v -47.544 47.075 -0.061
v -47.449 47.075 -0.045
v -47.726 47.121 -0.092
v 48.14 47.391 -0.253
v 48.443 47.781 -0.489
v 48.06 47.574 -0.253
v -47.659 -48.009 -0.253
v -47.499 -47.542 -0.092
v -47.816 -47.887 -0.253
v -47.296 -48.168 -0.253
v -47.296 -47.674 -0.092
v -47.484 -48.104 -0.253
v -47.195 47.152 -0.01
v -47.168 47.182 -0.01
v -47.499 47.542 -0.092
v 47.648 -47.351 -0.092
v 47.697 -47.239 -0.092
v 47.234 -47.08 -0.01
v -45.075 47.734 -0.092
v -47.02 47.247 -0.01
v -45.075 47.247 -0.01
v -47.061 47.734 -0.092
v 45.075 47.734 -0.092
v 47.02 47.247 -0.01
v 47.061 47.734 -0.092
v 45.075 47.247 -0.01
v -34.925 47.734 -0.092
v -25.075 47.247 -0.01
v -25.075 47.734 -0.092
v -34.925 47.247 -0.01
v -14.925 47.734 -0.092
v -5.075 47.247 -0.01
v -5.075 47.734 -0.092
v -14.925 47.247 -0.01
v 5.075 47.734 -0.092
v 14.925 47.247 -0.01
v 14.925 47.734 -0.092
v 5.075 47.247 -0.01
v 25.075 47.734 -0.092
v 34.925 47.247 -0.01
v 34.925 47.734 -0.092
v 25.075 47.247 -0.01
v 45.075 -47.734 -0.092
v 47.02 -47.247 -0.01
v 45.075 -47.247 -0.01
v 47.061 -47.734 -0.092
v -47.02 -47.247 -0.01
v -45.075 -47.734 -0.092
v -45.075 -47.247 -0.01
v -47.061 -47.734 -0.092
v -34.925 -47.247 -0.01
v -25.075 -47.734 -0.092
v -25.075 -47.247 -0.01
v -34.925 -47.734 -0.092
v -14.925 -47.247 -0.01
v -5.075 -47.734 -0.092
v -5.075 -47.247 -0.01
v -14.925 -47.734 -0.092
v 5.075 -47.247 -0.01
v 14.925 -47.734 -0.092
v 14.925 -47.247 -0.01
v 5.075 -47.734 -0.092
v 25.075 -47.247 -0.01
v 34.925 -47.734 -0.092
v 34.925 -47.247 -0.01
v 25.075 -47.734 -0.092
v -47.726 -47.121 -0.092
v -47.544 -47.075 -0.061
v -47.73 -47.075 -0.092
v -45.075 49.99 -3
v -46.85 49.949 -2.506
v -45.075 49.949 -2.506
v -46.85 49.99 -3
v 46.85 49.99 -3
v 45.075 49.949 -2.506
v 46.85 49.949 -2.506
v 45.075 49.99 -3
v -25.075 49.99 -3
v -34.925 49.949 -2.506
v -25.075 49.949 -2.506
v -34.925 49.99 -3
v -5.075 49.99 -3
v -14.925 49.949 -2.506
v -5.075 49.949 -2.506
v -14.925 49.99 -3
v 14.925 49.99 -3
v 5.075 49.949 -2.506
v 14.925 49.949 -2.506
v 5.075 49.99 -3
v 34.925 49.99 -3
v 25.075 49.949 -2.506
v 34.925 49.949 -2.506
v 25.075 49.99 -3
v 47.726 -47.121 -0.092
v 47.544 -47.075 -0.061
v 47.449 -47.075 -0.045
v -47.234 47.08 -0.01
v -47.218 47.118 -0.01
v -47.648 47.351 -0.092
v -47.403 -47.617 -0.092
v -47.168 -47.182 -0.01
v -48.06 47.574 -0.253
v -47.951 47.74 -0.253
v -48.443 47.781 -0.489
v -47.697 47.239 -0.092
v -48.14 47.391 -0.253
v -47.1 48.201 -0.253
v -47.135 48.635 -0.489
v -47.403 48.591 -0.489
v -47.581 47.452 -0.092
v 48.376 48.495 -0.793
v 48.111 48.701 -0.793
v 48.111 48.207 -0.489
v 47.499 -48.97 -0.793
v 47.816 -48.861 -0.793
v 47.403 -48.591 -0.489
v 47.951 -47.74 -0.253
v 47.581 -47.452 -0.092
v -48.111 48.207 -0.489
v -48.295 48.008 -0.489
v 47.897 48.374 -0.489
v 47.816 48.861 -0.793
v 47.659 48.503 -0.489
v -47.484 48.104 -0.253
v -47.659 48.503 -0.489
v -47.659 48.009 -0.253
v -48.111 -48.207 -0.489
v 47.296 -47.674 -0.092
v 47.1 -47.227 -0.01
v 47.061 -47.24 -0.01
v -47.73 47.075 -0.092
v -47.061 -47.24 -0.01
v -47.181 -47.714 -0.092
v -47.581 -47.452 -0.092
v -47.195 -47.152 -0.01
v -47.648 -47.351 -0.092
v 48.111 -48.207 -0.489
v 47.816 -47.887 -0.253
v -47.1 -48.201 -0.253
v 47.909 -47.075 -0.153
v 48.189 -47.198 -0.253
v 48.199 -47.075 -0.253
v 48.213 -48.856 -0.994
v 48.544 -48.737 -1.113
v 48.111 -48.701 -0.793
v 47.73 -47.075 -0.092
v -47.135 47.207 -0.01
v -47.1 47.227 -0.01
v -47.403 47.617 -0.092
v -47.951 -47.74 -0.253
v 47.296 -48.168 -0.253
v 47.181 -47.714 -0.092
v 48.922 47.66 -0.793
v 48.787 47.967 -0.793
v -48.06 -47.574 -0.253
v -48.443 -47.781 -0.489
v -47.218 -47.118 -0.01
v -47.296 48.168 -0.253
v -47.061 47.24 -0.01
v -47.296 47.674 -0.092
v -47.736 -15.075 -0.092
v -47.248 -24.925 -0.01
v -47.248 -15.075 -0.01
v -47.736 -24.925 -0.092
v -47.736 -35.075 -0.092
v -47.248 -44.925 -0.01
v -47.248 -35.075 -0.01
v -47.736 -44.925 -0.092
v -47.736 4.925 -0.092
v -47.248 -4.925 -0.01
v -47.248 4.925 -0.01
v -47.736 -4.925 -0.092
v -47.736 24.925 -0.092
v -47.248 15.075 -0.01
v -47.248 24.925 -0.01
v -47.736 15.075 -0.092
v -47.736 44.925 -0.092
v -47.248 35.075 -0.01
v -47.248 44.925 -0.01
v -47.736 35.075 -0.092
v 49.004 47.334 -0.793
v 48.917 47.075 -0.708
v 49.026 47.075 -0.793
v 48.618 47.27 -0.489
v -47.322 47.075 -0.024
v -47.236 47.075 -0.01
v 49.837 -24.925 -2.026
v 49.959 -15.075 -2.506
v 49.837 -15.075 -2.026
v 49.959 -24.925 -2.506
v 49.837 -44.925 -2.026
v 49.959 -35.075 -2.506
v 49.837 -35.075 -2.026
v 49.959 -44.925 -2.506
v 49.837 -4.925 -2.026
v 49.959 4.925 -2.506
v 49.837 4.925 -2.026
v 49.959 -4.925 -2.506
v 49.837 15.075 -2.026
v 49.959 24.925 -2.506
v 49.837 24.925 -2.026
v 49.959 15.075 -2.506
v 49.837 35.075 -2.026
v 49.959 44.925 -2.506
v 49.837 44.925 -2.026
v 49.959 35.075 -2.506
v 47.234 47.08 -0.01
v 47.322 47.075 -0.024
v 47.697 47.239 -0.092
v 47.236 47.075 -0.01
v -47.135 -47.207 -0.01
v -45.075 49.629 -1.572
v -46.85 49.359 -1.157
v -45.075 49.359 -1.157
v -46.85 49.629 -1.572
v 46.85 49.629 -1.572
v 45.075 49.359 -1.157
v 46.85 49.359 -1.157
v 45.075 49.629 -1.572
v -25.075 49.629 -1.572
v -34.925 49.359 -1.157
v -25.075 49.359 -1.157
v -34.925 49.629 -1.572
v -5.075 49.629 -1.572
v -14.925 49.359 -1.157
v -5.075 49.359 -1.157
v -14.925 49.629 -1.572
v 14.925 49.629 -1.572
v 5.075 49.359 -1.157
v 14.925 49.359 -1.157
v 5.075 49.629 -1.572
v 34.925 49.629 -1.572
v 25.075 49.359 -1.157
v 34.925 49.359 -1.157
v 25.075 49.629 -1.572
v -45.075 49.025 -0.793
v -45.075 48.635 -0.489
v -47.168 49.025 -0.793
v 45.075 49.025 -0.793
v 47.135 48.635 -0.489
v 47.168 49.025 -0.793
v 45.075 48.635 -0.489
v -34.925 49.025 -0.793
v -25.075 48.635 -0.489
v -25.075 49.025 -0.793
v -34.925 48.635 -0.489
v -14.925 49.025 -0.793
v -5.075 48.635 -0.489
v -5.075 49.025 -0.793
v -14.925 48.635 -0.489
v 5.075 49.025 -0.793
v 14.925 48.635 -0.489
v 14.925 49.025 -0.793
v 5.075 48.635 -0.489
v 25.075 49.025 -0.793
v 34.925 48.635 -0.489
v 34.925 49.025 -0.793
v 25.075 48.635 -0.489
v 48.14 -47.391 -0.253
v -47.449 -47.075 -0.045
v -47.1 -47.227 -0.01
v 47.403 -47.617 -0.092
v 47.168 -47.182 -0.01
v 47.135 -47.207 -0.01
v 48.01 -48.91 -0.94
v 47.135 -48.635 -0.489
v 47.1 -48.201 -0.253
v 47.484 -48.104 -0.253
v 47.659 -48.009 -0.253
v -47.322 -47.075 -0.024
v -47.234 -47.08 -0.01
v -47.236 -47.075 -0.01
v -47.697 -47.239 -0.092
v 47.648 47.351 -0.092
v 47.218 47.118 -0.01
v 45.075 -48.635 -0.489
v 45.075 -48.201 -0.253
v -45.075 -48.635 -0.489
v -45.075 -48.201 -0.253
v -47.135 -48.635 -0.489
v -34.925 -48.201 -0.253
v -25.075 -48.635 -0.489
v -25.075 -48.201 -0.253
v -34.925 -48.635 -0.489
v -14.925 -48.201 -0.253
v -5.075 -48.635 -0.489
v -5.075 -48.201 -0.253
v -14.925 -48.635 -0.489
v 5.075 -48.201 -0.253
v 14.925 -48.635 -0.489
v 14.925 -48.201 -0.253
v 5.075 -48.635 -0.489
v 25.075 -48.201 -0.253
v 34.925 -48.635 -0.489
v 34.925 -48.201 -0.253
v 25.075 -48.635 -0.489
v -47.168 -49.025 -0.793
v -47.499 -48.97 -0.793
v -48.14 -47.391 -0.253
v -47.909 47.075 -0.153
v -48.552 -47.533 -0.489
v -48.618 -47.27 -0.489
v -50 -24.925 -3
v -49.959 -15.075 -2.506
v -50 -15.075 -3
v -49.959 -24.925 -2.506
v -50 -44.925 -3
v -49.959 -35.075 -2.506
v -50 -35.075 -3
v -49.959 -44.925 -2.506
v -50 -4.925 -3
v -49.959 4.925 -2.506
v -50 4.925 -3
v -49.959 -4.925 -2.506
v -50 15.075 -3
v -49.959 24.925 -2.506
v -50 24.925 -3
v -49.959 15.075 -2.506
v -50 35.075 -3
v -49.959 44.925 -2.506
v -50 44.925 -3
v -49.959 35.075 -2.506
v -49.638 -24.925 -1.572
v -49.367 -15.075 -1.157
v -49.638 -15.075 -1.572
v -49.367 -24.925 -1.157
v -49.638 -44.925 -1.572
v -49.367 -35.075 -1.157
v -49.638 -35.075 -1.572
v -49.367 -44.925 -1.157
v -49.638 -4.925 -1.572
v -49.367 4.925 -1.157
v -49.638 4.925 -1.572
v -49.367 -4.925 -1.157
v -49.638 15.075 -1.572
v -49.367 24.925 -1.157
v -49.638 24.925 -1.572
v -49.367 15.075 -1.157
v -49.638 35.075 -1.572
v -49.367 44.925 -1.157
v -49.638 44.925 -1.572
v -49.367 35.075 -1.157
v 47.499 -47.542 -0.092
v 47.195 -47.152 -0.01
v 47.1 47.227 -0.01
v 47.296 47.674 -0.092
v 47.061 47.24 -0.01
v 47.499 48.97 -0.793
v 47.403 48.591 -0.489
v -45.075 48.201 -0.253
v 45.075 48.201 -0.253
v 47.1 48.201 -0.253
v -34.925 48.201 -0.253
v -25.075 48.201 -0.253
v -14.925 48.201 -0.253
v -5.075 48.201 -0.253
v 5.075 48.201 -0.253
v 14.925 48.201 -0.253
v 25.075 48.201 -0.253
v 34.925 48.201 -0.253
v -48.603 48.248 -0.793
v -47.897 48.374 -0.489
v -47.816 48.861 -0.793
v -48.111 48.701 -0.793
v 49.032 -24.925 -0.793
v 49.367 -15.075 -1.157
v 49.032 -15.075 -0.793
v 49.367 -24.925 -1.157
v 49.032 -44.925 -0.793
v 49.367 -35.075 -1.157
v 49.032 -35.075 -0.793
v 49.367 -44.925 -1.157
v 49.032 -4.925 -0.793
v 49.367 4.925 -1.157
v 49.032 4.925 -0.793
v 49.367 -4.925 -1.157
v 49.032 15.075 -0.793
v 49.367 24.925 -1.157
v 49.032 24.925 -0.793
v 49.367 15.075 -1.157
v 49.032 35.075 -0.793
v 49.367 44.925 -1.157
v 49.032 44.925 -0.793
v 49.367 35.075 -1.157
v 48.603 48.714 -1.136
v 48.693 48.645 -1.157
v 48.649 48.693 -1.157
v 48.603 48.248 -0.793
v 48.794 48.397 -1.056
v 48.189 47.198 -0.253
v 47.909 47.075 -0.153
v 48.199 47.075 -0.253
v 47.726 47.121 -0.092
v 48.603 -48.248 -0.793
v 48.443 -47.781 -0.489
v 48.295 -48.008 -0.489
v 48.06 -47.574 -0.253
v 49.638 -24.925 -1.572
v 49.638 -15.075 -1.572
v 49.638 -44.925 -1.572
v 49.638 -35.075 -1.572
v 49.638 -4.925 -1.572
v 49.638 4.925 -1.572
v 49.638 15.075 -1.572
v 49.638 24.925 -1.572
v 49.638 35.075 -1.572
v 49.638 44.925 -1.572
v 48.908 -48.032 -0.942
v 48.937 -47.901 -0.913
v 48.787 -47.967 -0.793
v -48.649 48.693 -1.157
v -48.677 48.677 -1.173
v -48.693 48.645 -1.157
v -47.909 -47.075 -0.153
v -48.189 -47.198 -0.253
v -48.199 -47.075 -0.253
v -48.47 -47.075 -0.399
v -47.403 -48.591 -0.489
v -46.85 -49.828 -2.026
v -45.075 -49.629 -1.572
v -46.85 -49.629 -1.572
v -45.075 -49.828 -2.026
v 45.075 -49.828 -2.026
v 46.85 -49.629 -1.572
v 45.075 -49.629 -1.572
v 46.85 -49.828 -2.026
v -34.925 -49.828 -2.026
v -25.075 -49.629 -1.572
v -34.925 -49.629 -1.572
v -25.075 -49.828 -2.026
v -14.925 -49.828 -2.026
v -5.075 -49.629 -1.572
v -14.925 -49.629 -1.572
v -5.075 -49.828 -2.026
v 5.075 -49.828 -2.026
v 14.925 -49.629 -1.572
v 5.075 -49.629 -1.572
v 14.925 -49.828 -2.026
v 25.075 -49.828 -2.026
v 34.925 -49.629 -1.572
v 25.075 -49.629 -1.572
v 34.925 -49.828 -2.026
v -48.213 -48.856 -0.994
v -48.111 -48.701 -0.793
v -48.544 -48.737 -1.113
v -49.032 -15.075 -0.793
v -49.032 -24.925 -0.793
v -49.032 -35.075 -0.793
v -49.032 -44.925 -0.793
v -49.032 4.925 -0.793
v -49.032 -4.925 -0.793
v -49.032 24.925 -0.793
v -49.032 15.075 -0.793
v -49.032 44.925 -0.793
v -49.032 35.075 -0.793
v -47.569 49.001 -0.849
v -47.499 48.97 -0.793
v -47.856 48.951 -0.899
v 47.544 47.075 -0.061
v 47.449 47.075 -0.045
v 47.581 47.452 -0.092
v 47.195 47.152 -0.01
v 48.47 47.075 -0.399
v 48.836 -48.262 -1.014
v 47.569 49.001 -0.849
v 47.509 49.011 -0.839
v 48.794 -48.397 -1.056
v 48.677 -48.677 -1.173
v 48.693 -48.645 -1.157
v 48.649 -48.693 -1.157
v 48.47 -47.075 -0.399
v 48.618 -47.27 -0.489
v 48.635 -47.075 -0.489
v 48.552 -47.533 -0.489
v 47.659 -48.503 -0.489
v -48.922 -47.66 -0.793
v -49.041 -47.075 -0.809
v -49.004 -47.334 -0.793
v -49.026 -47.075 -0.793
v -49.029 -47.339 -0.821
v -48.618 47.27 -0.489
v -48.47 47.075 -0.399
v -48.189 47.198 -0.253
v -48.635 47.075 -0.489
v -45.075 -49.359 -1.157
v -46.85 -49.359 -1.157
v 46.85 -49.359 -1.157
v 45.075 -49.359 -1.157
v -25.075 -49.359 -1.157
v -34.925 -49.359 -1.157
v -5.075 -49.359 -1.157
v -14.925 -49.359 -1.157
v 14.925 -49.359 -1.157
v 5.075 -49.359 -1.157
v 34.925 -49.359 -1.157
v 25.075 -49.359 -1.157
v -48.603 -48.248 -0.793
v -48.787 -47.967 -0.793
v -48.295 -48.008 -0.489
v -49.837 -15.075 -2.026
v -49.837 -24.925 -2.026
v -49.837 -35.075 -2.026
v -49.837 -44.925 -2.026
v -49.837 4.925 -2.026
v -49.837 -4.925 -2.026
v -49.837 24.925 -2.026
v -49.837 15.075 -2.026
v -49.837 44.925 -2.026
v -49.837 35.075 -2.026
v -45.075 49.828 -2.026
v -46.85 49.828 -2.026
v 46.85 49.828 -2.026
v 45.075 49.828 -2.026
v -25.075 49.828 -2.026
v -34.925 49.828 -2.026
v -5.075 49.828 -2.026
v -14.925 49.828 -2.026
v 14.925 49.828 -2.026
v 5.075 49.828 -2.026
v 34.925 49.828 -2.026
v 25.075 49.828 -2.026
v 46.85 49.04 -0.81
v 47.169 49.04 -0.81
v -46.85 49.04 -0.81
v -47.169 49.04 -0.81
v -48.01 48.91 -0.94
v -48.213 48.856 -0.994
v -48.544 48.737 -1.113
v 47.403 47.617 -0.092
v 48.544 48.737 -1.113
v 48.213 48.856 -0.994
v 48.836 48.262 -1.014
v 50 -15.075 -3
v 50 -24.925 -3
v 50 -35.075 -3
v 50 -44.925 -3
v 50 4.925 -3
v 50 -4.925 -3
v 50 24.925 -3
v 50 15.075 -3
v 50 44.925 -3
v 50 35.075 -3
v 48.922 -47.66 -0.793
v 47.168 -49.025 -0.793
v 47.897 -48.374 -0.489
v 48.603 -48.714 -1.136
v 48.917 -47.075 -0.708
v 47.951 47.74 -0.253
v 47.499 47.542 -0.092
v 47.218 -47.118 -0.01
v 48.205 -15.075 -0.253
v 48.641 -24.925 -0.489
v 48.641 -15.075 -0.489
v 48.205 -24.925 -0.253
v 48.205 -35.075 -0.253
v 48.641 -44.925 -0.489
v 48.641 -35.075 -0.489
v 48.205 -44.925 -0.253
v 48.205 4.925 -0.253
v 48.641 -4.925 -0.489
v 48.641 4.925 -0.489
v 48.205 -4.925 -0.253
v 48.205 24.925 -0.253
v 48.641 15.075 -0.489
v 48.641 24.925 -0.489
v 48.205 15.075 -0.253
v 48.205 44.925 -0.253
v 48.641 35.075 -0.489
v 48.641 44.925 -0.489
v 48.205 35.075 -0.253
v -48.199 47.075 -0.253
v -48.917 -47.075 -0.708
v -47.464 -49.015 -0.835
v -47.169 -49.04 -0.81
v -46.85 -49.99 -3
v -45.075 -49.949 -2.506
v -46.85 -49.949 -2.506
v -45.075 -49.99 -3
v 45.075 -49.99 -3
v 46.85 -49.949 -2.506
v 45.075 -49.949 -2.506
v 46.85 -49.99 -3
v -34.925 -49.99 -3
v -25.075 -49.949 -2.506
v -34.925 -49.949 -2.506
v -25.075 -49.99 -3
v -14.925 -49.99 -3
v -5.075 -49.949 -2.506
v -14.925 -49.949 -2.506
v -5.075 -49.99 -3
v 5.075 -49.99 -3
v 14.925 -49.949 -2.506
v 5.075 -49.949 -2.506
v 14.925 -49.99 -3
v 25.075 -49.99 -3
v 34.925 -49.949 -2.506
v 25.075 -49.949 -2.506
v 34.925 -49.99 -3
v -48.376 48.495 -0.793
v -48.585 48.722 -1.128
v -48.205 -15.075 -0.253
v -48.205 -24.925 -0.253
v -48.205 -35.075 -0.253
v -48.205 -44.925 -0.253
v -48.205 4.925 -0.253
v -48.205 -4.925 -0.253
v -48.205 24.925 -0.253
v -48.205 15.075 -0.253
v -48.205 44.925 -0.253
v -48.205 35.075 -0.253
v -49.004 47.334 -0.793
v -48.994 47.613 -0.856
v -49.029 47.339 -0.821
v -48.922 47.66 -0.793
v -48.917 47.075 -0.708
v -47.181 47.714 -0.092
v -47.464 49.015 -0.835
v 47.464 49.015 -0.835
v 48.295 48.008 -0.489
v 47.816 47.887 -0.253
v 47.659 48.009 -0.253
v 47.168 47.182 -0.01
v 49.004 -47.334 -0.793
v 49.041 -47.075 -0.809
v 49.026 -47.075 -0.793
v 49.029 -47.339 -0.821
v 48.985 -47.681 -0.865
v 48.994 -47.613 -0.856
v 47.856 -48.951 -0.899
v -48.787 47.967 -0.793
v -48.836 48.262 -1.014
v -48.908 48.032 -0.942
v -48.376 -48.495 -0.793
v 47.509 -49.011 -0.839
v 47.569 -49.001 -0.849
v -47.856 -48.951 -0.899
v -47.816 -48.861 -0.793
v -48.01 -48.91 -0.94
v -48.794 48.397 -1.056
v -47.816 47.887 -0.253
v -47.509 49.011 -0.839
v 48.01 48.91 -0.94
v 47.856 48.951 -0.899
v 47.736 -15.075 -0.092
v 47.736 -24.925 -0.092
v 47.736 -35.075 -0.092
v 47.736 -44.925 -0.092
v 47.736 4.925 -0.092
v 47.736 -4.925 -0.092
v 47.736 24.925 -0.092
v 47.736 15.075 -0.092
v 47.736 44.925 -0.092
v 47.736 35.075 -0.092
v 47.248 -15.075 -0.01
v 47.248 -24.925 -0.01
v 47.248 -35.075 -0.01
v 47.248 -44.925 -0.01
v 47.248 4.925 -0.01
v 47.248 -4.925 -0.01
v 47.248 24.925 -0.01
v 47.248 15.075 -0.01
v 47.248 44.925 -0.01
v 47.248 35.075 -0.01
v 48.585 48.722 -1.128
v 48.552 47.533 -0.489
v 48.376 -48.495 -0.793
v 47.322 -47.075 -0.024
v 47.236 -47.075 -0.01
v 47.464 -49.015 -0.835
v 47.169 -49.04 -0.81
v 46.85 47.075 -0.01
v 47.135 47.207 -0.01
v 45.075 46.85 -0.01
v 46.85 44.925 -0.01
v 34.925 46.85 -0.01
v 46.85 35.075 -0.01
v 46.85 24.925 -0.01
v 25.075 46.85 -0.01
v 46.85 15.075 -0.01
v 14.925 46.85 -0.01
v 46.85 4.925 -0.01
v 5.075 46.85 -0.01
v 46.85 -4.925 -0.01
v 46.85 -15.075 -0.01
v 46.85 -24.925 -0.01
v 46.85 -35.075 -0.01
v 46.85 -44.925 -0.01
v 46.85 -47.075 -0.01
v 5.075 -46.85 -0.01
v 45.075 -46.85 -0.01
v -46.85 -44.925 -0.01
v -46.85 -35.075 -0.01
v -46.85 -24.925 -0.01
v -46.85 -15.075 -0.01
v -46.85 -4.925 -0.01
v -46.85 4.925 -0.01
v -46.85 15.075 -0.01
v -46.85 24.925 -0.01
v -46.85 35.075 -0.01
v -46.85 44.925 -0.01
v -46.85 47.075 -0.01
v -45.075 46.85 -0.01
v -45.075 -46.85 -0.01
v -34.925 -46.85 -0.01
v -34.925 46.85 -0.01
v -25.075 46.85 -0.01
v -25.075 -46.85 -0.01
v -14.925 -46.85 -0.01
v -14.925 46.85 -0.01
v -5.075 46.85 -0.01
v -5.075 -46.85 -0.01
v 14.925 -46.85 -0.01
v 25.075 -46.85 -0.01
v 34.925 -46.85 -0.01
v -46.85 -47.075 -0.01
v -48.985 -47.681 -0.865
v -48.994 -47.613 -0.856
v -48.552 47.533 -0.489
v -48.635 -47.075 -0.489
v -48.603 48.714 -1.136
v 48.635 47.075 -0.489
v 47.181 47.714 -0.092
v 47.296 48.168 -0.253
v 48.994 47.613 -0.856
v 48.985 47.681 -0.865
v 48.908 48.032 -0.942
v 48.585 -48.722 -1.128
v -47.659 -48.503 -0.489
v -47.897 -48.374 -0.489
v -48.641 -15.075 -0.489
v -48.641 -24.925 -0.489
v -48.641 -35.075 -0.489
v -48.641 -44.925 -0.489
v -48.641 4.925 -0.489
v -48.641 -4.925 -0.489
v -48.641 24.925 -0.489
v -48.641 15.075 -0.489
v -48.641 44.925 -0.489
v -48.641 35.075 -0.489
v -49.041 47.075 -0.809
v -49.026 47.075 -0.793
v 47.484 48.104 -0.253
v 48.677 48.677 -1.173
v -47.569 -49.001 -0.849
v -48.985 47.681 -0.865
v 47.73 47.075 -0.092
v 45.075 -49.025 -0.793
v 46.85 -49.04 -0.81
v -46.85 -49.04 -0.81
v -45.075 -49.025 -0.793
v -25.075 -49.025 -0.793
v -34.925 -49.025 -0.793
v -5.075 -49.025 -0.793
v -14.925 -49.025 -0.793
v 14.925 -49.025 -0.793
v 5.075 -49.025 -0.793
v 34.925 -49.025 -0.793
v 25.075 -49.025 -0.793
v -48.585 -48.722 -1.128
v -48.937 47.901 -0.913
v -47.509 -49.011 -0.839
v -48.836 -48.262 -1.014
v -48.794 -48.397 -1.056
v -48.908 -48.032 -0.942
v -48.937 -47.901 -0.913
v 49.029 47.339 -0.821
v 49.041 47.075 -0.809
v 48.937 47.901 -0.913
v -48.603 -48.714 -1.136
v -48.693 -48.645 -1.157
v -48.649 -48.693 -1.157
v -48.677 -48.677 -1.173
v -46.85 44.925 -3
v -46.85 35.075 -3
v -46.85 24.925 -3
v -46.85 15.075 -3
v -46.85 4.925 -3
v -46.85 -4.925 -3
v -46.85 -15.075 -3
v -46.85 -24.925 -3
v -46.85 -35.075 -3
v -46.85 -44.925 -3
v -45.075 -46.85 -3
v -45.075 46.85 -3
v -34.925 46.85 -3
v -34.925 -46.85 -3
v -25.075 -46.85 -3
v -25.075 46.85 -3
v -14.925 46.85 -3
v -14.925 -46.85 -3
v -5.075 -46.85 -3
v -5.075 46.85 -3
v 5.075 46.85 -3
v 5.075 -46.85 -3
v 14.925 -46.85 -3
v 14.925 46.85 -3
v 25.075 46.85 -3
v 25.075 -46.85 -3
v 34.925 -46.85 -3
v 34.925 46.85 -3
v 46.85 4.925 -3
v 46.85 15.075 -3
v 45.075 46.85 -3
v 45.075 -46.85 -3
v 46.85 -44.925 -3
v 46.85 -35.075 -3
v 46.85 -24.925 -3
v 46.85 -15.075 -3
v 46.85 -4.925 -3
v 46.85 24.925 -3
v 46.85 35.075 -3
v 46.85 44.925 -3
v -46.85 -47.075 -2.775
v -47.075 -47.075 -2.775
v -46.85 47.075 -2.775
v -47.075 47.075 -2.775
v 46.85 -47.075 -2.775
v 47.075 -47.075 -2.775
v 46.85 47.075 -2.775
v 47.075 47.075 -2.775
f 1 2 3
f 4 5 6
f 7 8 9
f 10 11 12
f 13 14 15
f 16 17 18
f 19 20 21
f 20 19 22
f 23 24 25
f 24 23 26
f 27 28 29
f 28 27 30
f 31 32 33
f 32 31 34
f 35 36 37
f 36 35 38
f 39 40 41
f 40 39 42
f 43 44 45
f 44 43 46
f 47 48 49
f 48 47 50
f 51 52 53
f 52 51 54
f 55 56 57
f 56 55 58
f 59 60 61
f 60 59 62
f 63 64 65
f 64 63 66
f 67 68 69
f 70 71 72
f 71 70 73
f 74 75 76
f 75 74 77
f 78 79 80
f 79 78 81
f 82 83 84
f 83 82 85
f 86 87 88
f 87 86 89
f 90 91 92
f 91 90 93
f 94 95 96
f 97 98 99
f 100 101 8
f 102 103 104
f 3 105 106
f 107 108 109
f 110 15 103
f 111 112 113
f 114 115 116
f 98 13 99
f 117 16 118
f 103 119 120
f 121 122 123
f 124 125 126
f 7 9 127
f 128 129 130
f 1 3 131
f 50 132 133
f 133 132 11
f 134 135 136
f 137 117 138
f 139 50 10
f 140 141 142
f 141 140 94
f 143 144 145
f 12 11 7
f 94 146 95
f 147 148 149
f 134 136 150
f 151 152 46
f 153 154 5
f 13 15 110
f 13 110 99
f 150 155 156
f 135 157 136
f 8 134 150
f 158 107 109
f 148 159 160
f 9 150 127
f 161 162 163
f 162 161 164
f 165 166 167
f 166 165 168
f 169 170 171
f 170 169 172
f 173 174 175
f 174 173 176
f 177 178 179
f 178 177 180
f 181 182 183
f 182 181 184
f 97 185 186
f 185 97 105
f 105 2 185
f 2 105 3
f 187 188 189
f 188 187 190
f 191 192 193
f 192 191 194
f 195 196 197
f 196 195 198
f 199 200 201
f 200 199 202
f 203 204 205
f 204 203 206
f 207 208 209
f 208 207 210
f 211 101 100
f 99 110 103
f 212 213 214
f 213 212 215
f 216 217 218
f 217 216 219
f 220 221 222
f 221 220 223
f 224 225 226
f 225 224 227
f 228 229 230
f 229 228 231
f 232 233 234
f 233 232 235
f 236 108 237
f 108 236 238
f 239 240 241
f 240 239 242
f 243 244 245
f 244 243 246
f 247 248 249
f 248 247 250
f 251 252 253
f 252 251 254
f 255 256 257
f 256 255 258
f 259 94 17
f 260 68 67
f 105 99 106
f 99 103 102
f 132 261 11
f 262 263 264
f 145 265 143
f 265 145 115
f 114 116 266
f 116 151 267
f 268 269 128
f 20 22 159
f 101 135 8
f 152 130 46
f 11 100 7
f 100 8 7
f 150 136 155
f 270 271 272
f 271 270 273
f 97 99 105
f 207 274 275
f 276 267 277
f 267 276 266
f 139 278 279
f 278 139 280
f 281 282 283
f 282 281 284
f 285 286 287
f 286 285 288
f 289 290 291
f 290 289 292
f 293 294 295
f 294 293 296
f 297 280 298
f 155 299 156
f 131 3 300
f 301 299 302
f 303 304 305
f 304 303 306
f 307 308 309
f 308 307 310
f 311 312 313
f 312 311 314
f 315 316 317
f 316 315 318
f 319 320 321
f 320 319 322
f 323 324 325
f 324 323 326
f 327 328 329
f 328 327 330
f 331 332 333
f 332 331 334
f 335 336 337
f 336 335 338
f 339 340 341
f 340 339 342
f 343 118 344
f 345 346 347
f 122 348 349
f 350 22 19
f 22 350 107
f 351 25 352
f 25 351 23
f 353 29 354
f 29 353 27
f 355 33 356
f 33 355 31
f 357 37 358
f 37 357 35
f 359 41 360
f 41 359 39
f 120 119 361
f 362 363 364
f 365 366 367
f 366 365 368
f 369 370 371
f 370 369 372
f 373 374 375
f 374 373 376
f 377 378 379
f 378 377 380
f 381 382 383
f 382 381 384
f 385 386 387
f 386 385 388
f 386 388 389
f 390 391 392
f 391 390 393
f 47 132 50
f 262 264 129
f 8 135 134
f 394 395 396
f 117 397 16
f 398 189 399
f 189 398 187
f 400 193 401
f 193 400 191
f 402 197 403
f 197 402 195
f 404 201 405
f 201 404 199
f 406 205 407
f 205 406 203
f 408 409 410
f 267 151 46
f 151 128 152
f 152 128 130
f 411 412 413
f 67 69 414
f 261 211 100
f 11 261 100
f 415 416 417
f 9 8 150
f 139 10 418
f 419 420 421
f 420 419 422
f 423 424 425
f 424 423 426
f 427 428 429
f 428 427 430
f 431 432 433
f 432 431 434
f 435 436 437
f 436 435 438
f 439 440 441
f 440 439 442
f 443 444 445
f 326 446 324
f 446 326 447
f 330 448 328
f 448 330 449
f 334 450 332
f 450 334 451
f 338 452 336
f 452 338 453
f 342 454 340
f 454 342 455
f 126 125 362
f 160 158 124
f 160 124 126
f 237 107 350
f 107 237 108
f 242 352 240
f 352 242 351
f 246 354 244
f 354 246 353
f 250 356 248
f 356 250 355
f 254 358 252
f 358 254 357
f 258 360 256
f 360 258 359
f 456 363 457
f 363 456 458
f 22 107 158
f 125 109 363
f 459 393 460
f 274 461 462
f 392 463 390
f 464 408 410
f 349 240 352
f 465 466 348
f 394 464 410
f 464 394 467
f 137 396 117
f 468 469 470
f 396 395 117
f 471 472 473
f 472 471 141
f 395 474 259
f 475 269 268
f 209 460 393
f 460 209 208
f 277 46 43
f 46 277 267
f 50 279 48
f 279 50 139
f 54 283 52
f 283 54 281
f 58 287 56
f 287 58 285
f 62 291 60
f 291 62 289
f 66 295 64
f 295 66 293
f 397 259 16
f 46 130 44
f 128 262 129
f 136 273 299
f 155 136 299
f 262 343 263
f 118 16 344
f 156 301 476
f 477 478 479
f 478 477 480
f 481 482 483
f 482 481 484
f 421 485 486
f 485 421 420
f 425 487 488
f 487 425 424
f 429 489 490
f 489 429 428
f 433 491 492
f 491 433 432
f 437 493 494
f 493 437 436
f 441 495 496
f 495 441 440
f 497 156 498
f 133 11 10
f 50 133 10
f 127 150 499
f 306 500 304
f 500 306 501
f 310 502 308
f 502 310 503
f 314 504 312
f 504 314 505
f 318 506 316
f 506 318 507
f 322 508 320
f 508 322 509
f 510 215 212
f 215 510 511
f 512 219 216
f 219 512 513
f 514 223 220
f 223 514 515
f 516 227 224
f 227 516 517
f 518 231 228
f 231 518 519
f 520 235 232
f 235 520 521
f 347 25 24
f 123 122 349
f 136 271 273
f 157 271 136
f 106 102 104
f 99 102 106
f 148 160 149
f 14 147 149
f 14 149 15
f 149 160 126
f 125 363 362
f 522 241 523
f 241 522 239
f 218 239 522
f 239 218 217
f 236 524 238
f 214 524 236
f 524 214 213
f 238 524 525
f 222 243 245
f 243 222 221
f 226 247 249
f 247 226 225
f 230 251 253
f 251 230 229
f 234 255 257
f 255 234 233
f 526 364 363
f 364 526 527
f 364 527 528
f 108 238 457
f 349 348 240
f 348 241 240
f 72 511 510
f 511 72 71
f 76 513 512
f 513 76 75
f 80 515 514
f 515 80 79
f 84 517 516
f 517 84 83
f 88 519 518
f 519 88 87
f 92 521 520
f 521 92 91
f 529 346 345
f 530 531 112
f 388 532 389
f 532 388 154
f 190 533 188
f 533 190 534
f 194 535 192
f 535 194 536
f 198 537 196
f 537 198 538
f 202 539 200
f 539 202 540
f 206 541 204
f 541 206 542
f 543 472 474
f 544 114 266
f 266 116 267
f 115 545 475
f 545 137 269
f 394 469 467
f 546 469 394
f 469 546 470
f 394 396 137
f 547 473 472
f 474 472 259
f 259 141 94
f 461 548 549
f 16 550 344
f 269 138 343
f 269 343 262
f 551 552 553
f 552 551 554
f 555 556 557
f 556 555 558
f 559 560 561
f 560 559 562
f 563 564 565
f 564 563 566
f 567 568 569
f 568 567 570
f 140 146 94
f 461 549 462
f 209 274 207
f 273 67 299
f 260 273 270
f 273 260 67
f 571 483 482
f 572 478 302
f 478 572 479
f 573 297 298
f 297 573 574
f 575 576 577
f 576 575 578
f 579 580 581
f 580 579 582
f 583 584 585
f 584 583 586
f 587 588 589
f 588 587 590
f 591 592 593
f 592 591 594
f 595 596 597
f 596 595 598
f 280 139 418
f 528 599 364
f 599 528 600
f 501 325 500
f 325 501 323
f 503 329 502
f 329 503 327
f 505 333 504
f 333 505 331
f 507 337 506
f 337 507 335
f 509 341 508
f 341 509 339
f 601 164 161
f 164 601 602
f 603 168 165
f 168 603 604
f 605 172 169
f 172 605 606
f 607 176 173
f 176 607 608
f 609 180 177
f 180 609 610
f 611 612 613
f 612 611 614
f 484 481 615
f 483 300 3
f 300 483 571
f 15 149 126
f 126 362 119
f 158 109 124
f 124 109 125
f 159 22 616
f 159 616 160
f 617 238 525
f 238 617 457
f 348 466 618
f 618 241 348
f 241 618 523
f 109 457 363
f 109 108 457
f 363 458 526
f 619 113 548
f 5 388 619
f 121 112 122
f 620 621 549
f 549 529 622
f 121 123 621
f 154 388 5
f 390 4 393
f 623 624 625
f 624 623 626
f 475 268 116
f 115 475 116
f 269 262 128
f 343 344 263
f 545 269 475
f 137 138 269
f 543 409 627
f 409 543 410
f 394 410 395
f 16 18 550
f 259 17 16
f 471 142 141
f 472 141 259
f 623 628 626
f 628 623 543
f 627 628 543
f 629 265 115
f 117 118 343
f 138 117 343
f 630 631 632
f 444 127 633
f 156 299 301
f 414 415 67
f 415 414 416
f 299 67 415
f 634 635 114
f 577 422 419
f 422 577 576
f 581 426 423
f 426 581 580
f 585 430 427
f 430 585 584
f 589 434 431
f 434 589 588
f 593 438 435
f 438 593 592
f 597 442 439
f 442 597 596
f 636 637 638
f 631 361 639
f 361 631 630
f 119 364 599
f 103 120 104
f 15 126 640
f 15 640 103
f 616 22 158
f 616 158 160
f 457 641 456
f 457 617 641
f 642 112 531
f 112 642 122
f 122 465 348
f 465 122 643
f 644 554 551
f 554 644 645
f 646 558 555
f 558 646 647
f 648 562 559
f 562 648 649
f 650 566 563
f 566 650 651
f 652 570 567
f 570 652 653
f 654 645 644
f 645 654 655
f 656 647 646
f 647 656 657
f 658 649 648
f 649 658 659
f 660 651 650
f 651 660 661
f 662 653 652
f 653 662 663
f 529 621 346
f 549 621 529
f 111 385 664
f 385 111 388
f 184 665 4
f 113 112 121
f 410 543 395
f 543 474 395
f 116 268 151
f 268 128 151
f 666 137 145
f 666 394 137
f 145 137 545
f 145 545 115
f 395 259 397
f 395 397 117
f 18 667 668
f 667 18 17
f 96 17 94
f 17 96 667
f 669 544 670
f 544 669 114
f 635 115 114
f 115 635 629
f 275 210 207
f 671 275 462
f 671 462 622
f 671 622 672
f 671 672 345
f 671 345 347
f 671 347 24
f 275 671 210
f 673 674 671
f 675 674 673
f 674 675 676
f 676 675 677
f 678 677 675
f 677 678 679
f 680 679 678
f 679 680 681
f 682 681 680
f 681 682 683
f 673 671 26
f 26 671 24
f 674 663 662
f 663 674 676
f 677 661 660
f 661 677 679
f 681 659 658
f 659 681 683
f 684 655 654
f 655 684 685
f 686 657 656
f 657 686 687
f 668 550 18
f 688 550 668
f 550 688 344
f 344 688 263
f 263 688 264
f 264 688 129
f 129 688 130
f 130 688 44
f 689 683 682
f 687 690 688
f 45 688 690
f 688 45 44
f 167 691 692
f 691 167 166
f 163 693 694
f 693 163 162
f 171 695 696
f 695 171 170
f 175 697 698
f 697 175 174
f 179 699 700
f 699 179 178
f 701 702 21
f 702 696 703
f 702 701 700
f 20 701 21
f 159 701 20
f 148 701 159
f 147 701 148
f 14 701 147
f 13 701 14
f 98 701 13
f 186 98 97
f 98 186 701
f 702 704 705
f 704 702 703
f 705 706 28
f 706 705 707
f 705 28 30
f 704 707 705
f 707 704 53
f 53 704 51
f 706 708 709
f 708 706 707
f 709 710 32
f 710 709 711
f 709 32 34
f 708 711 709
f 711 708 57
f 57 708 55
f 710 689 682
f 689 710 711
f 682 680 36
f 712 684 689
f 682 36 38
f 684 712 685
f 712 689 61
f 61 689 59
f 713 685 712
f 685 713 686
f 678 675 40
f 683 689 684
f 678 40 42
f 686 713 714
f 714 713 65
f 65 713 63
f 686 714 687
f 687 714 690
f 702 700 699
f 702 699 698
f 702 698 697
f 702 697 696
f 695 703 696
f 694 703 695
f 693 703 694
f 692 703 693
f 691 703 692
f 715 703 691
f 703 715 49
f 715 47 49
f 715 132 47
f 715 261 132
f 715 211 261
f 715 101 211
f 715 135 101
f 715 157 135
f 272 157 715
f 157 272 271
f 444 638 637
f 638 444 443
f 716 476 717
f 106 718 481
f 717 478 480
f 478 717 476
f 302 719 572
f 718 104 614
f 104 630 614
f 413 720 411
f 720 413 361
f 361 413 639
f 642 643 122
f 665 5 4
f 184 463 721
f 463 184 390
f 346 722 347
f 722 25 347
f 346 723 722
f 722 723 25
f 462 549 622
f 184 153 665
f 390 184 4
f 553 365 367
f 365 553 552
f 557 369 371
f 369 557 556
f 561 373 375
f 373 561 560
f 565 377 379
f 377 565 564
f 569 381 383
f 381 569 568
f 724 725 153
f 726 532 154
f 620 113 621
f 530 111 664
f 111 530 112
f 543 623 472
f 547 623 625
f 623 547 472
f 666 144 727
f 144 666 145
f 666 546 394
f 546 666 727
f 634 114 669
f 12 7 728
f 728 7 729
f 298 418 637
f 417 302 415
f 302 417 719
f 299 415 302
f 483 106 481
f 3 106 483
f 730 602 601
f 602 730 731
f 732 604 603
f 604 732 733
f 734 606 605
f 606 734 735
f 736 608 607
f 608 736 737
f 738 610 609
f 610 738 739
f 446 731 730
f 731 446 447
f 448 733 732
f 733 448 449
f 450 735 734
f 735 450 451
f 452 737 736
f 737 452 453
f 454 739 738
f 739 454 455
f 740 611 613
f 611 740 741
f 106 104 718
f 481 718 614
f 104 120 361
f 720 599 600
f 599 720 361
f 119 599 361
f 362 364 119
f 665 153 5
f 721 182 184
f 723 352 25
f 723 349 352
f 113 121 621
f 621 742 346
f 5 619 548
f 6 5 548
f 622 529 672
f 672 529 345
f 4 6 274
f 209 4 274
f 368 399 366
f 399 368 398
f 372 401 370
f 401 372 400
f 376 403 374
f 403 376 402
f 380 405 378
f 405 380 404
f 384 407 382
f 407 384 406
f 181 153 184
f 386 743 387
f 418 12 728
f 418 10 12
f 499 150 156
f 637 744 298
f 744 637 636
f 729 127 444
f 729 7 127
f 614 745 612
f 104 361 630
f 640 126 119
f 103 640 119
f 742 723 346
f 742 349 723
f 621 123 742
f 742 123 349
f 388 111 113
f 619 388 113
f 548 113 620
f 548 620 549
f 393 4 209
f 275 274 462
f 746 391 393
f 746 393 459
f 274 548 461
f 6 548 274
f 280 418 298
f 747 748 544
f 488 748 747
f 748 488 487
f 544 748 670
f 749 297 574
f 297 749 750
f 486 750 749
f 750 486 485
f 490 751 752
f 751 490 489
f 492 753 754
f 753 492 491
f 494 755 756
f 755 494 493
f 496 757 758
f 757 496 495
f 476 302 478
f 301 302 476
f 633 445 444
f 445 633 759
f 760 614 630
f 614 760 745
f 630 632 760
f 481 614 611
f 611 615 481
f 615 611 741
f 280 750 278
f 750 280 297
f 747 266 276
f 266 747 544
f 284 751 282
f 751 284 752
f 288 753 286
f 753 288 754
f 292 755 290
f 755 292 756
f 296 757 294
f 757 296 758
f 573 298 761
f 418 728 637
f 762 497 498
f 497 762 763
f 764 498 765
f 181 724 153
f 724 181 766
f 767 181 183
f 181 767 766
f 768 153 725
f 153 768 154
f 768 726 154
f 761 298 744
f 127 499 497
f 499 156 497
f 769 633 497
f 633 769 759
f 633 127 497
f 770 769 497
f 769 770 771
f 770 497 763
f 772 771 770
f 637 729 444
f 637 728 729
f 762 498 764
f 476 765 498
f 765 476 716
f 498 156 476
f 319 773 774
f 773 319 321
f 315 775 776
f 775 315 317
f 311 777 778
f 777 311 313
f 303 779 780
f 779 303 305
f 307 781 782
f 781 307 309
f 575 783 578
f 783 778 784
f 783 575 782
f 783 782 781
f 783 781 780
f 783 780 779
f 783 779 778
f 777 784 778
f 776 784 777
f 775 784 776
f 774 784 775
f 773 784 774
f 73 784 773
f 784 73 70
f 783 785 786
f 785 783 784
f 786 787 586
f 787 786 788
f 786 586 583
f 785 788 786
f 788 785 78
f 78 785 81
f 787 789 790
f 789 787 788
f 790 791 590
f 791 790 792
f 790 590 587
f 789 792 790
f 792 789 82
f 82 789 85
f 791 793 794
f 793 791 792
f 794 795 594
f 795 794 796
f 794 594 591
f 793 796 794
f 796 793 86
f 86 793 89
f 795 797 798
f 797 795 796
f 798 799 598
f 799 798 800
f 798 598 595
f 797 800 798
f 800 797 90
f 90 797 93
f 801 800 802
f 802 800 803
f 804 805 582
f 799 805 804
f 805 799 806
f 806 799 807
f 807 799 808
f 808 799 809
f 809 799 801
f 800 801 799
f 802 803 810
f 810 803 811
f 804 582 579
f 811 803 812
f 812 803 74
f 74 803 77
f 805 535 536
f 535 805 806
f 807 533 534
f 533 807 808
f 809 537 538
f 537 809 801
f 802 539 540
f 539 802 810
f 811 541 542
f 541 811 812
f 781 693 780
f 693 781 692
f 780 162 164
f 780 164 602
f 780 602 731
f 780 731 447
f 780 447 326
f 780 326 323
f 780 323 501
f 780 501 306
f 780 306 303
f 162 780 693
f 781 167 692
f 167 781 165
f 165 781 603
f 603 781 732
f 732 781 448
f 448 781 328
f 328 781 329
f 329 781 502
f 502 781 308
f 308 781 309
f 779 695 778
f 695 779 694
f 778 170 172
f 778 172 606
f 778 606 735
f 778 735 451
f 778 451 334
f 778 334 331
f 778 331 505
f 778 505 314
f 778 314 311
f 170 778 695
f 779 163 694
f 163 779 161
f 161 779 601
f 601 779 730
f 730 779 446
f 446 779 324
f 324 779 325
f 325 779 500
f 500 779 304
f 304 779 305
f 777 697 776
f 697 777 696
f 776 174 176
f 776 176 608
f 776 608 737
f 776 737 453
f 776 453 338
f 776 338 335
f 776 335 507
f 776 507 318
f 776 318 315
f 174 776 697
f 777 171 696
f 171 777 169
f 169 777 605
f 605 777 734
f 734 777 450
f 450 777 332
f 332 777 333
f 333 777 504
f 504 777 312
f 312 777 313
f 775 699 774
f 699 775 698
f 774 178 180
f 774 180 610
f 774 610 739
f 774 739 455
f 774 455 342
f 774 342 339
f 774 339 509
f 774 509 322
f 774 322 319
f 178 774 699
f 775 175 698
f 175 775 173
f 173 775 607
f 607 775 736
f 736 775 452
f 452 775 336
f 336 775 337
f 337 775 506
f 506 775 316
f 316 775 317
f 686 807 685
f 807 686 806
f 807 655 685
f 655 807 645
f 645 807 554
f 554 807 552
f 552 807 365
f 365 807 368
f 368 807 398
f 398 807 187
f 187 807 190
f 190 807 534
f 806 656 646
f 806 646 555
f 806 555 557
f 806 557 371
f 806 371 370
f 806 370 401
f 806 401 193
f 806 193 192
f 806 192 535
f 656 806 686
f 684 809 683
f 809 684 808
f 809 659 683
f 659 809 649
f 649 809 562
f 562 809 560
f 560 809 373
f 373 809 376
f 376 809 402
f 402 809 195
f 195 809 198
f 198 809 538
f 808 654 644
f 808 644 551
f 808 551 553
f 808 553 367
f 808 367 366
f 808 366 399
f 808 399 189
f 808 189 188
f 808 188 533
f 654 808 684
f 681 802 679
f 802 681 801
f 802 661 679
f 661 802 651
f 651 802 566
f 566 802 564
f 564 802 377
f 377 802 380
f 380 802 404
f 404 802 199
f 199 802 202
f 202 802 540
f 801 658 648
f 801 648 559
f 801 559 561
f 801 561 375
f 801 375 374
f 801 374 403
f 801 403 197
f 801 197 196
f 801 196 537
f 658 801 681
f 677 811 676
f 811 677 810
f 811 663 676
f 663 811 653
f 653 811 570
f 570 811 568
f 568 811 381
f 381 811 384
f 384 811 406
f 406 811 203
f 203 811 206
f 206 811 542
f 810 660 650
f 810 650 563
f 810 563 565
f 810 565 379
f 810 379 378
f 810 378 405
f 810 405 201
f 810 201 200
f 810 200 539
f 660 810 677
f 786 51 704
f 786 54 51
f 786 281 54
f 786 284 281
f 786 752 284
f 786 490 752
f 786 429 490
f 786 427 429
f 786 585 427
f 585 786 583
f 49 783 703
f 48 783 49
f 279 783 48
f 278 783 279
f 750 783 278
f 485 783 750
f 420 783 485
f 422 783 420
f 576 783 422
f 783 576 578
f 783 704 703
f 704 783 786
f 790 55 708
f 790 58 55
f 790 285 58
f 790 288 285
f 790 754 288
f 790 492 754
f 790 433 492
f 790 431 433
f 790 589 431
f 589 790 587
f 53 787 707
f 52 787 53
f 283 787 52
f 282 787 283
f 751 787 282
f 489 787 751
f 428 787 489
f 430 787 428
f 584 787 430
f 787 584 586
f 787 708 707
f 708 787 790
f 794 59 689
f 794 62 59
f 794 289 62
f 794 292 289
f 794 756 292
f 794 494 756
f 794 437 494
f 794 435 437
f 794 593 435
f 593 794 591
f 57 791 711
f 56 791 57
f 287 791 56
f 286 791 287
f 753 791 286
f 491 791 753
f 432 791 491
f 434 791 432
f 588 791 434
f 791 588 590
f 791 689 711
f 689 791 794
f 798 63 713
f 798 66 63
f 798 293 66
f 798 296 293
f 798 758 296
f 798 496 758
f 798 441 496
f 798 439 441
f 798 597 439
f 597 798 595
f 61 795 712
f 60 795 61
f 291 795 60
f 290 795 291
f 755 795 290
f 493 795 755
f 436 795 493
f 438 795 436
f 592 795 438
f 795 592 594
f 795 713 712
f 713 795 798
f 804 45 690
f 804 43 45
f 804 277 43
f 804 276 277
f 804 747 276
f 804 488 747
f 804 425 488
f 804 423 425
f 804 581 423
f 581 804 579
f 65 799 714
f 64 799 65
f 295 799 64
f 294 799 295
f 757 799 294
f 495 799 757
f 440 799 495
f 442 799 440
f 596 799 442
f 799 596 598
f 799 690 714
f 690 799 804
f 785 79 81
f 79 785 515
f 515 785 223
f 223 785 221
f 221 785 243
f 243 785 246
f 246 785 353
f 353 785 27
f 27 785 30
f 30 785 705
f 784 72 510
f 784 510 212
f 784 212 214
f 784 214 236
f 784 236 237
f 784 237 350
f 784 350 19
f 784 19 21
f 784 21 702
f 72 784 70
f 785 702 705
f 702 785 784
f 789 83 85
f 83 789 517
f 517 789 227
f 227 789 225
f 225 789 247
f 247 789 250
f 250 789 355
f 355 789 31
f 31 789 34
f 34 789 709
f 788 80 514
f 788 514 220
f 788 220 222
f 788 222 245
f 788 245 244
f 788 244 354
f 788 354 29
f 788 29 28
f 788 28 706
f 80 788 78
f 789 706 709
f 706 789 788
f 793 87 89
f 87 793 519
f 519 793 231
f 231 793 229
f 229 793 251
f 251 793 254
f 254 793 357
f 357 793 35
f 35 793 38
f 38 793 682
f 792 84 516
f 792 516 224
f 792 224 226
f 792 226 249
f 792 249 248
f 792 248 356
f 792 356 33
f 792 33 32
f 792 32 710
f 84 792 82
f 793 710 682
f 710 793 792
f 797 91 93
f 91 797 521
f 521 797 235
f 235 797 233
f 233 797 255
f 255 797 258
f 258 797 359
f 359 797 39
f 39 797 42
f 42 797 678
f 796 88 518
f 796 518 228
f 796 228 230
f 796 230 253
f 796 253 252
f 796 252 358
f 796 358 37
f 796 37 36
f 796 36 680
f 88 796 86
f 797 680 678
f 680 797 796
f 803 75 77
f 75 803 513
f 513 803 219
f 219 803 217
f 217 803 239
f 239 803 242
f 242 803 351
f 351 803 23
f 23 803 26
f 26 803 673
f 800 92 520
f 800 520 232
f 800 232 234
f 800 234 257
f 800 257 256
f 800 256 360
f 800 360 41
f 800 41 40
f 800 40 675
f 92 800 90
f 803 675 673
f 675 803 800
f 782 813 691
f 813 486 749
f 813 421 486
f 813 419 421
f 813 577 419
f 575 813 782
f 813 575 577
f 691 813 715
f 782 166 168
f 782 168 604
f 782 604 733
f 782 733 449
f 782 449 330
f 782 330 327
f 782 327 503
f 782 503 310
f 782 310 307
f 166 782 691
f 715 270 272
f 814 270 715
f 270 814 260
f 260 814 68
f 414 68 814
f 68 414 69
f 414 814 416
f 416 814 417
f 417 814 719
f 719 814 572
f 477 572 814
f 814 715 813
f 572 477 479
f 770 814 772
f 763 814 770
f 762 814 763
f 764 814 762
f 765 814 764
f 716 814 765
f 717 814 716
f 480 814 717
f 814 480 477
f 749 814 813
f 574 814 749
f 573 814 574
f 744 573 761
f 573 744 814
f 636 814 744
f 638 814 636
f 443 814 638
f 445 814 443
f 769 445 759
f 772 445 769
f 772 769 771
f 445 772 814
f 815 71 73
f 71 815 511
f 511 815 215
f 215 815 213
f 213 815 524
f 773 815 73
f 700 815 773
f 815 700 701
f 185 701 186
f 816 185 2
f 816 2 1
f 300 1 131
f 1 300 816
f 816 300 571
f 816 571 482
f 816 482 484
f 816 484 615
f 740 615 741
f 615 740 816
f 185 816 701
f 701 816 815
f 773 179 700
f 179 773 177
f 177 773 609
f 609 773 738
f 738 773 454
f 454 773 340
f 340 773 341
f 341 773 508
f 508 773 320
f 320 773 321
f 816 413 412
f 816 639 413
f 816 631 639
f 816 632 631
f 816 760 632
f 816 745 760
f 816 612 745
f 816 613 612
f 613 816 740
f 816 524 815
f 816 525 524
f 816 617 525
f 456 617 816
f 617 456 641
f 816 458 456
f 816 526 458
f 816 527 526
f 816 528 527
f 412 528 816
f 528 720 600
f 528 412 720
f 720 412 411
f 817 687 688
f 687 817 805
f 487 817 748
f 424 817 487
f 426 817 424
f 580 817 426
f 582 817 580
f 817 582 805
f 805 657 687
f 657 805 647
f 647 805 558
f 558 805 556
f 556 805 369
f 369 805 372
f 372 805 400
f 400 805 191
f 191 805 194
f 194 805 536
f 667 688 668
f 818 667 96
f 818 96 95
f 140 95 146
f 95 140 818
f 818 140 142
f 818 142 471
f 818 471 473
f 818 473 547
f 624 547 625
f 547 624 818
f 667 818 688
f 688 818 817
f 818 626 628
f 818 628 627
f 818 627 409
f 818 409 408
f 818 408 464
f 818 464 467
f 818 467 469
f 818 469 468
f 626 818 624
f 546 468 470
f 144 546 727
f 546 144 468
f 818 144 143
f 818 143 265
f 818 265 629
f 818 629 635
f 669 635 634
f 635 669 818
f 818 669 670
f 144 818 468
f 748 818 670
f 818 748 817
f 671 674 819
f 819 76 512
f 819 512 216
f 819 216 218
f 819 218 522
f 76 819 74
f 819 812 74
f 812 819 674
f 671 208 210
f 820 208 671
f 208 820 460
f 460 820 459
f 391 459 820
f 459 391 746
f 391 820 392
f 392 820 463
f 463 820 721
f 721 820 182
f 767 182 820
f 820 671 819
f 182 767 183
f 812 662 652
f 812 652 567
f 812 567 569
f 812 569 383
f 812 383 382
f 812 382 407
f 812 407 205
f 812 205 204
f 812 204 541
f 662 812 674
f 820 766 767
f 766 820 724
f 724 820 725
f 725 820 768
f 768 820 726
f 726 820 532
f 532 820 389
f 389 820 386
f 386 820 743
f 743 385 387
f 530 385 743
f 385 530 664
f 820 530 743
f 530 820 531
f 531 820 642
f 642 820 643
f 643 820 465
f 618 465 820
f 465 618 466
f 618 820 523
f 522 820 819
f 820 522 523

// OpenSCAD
// https://akizukidenshi.com/catalog/g/gP-17641/
$fa=6;
$fs=.5;
g=.15;
// use <../Zen Maru Gothic.ttf>
module rcube(w=[10,10,10],r=1){translate([r,r,r])minkowski(){cube([w[0]-r-r,w[1]-r-r,w[2]-r-r]);sphere(r);}}

module panel(){
	translate([-50,-50,-3]){
	difference(){
		scale([1,1,-1])translate([0,0,-3])intersection(){
		rcube([100,100,10],3);
		cube([100,100,3]);
		}
		for(i=[1:4])translate([0,(i)/5*100,0])cube([6+g+g,10+g,10],center=true);
			translate([0,4,0])cube([6+g+g,2+g,10],center=true);
				translate([3+g,0,0])rotate([0,-135,0])cube(3+g);
				translate([0,3+g,0])rotate([135,0,0])cube(3+g);
			translate([0,100-4,0])cube([6+g+g,2+g,10],center=true);
				translate([3+g,100,0])rotate([0,45,180])cube(3+g);
				translate([0,100-3-g,0])rotate([-45,0,0])cube(3+g);

		for(i=[1:4])translate([100,(i)/5*100,0])cube([6+g+g,10+g,10],center=true);
			translate([100,4,0])cube([6+g+g,2+g,10],center=true);
				translate([100-3-g,0,0])rotate([0,45,0])cube(3+g);
				translate([100,3+g,0])rotate([-45,0,180])cube(3+g);
			translate([100,100-4,0])cube([6+g+g,2+g,10],center=true);
				translate([100-3-g,100,0])rotate([0,-135,180])cube(3+g);
				translate([100,100-3-g,0])rotate([135,0,180])cube(3+g);

		for(i=[0:4])translate([(i+.5)/5*100,0,0])cube([10+g,6+g+g,10],center=true);
		for(i=[0:4])translate([(i+.5)/5*100,100,0])cube([10+g,6+g+g,10],center=true);
	}
}
}

module assembled(){
	rotate([0,0,0]){translate([0,0,-50])rotate([180,0,0])panel();translate([0,0,50])panel();}
	rotate([90,90,0]){translate([0,0,-50])rotate([180,0,0])panel();translate([0,0,50])panel();}
	rotate([90,0,90]){translate([0,0,-50])rotate([180,0,0])panel();translate([0,0,50])panel();}
}

module stack(){for(i=[0:5])translate([0,0,3.2*i])panel();}

panel();
